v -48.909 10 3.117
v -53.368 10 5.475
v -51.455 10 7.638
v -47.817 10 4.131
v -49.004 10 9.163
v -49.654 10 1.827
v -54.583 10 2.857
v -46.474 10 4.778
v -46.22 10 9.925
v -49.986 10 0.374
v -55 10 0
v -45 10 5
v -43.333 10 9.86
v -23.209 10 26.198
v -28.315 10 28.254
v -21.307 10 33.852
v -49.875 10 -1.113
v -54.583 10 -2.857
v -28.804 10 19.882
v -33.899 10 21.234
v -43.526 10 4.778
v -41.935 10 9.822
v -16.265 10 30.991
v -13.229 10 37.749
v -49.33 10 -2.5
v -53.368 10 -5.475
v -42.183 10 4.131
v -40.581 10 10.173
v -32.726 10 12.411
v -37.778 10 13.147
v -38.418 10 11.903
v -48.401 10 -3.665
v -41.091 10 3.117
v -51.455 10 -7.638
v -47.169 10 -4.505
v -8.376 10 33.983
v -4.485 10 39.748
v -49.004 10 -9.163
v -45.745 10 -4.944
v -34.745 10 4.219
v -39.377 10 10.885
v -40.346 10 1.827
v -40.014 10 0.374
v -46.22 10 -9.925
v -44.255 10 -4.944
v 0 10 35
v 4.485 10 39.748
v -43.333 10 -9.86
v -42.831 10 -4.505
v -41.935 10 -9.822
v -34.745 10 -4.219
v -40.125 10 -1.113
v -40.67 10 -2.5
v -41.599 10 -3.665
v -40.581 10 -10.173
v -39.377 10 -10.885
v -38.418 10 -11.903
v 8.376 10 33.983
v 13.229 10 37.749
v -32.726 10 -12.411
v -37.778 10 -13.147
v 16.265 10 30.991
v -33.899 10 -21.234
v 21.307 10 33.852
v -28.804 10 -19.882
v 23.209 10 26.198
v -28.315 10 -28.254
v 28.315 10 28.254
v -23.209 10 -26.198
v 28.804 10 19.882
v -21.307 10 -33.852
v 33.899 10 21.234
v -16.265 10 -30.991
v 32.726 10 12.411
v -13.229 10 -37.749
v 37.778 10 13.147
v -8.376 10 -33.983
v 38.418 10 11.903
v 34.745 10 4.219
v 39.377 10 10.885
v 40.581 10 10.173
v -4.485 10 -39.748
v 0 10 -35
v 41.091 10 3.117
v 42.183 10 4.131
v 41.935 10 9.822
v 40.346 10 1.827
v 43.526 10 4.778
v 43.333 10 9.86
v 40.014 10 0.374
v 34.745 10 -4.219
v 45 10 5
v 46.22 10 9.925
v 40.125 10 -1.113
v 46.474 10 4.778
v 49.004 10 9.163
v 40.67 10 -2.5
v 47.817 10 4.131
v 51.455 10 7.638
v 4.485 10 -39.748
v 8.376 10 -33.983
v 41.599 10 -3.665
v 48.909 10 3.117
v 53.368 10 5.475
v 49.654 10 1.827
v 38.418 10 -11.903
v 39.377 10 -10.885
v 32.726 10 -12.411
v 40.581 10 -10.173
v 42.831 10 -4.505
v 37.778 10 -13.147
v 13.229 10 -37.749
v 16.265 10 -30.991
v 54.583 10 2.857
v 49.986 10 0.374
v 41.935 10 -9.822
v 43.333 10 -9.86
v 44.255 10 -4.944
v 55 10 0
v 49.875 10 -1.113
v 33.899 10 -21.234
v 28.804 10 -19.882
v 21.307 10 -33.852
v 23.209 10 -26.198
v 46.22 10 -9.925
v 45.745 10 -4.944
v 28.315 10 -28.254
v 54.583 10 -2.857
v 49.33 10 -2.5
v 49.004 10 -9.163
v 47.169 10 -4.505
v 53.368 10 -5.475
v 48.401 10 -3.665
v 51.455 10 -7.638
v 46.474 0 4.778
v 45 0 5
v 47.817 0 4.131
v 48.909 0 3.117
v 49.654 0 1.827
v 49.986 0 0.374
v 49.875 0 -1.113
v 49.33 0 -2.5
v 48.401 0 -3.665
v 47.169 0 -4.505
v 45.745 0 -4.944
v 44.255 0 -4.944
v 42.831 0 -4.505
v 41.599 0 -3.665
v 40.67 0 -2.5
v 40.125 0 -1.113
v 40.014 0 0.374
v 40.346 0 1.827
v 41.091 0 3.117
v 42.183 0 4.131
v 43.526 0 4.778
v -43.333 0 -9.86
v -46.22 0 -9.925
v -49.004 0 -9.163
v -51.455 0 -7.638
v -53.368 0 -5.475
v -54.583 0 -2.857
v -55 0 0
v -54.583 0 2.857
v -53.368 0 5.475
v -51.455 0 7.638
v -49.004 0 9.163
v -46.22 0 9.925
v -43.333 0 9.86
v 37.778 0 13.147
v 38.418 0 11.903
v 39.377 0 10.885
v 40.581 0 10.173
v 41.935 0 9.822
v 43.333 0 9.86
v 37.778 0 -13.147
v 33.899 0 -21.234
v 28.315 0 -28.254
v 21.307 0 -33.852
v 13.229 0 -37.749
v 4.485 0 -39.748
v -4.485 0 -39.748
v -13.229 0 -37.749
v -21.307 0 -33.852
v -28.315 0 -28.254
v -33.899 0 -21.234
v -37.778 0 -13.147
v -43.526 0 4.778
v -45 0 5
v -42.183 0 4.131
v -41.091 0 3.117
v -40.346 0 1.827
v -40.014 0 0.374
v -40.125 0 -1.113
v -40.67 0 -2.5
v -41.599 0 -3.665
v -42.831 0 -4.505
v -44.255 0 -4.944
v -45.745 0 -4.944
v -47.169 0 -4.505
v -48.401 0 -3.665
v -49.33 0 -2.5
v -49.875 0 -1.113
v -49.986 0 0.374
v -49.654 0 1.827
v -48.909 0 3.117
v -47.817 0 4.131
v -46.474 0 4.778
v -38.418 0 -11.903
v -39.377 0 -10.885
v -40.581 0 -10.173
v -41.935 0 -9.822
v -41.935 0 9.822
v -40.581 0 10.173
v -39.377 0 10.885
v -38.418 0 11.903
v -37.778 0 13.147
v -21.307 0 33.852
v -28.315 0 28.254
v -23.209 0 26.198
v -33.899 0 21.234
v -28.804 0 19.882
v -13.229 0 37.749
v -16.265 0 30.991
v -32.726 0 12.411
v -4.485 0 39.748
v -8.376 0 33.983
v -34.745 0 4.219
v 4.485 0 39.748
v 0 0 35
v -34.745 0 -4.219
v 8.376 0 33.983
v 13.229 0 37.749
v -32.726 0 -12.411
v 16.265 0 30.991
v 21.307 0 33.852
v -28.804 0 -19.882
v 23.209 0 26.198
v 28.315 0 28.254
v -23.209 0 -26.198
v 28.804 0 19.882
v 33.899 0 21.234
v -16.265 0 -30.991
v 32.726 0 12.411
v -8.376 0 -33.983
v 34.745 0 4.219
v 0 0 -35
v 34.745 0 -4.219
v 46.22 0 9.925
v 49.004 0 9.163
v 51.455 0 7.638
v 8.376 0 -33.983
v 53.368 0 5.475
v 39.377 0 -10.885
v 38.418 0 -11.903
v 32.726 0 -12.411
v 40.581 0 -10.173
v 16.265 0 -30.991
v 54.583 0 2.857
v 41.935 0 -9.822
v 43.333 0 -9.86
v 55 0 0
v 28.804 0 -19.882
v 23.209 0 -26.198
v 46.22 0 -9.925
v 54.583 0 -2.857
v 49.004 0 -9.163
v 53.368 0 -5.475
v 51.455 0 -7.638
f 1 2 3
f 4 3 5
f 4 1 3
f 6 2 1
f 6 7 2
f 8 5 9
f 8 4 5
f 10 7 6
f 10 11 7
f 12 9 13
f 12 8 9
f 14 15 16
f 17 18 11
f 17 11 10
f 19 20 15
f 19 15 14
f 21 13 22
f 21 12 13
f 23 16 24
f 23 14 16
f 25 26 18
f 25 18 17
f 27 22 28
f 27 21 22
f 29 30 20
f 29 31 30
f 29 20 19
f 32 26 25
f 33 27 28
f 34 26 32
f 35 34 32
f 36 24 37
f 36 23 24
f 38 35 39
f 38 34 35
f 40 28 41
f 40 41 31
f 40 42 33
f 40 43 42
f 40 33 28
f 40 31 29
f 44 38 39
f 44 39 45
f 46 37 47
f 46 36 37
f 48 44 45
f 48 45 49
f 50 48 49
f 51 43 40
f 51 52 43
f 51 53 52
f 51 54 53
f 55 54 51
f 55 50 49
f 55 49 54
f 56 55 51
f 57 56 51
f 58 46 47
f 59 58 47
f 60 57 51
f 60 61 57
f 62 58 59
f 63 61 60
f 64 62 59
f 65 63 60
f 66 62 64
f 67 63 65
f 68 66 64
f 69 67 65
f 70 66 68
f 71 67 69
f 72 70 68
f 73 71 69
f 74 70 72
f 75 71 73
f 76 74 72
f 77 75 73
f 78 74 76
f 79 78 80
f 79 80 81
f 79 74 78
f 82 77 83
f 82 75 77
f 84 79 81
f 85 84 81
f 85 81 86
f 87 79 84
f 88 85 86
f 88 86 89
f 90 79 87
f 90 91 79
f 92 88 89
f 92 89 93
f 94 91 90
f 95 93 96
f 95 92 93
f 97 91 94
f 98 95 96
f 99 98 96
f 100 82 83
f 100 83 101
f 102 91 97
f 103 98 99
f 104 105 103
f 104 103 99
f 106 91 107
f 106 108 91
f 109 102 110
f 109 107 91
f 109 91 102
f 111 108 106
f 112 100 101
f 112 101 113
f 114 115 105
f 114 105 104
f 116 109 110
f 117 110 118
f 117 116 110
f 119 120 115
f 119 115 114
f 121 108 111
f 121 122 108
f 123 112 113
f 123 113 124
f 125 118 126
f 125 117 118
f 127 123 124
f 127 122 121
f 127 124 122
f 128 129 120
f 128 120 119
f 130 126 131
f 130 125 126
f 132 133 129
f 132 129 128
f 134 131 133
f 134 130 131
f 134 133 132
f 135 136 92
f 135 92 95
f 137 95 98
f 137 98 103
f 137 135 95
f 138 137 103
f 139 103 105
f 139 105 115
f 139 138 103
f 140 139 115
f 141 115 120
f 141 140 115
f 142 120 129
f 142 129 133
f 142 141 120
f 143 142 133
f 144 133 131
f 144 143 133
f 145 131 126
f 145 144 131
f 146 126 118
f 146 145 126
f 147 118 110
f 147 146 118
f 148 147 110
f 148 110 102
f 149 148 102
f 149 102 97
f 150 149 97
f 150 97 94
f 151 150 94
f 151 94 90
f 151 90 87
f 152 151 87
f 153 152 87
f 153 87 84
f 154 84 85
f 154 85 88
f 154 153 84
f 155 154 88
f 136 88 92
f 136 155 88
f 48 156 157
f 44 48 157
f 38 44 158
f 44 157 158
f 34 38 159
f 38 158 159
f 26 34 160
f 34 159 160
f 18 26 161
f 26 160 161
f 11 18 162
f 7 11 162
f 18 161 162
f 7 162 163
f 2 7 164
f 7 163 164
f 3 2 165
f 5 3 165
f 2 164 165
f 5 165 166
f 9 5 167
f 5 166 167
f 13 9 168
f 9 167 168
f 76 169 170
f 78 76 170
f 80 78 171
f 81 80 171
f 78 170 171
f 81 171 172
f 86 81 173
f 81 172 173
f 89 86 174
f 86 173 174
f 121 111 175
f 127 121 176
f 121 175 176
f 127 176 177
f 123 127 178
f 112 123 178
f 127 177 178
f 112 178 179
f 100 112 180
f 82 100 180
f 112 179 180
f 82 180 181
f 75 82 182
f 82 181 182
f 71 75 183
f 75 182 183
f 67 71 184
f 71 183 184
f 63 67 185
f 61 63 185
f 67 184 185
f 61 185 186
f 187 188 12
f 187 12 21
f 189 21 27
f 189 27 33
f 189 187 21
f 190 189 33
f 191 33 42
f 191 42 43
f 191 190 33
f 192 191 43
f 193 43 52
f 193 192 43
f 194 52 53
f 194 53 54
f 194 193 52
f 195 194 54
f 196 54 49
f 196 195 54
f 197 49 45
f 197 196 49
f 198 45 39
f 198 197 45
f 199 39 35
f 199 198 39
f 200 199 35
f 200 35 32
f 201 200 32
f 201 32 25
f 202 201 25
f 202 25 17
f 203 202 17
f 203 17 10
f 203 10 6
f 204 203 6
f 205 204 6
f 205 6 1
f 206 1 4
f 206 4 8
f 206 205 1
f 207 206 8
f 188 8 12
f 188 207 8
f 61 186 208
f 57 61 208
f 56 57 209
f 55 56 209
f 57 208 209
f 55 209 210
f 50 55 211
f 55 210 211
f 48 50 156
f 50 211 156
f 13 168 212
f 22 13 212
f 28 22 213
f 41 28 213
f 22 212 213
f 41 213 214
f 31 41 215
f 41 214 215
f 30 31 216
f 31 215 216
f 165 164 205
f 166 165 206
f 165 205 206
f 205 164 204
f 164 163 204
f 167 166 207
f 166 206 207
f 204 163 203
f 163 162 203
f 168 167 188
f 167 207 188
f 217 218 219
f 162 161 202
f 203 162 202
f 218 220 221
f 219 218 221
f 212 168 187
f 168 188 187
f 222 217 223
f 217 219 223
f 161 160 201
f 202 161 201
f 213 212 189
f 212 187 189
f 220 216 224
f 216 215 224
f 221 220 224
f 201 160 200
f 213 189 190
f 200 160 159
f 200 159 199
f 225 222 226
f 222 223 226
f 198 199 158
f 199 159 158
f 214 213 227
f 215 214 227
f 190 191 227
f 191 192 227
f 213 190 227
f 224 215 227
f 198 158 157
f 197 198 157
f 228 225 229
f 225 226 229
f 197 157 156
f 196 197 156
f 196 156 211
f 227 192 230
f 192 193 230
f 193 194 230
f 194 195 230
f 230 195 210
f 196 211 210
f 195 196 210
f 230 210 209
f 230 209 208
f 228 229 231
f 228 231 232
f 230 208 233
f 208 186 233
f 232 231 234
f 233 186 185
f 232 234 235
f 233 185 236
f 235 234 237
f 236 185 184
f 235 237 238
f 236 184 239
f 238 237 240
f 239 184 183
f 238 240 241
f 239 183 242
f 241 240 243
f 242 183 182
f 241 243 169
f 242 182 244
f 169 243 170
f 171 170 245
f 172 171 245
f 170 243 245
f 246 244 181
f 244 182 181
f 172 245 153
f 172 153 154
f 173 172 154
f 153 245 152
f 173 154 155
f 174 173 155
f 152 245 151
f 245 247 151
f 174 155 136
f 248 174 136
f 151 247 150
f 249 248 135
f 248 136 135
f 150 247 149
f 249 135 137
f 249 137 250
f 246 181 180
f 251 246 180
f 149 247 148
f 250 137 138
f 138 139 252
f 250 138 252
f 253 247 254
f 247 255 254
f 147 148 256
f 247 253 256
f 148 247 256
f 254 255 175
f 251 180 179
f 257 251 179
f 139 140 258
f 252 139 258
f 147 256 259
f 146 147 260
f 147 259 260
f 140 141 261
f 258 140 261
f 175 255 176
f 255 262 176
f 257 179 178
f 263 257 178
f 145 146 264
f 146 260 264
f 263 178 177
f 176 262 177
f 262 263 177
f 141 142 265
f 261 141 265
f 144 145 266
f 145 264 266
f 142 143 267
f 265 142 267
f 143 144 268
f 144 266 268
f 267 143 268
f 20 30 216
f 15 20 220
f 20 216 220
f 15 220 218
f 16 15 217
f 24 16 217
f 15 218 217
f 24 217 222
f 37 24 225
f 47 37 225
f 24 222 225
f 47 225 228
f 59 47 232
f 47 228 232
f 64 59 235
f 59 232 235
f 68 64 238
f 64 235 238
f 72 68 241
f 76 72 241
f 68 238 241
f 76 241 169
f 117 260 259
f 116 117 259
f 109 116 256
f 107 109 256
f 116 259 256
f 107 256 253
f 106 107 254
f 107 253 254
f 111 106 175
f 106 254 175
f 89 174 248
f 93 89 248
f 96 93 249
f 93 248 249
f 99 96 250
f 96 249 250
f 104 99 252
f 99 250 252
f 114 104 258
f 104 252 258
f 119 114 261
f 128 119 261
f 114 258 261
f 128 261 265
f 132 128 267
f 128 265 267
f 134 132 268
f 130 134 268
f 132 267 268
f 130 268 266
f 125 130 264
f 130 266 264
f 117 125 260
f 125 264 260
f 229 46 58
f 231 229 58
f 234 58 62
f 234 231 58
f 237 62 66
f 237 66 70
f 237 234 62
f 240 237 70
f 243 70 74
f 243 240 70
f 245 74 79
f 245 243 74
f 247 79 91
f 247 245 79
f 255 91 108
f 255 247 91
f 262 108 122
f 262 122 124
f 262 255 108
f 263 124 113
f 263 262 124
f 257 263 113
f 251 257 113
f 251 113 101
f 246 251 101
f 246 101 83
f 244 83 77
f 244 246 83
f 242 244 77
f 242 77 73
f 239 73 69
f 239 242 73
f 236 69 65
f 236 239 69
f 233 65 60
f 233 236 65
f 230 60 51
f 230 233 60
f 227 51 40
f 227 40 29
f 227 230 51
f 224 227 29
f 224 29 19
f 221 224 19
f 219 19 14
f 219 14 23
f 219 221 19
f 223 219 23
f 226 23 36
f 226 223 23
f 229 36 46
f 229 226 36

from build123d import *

# Parameters (mm, degrees)
SKETCH1_R           = 35
SKETCH1_R_2         = 5
BOSS_EXTRUDE1_DEPTH = 10


with BuildPart() as part:
    # Sketch1 → Boss-Extrude1 (new body)
    with BuildSketch(Plane(origin=(0, 0, 0), x_dir=(1, 0, 0), z_dir=(0, 1, 0))):
        with BuildLine():
            ThreePointArc((-37.777777778, -13.146843962), (0, -40), (37.777777778, -13.146843962))
            ThreePointArc((37.777777778, -13.146843962), (39.954124614, -10.486884629), (43.333333333, -9.860132972))
            ThreePointArc((43.333333333, -9.860132972), (55, 0), (43.333333333, 9.860132972))
            ThreePointArc((43.333333333, 9.860132972), (39.954124614, 10.486884629), (37.777777778, 13.146843962))
            ThreePointArc((37.777777778, 13.146843962), (0, 40), (-37.777777778, 13.146843962))
            ThreePointArc((-37.777777778, 13.146843962), (-39.954124614, 10.486884629), (-43.333333333, 9.860132972))
            ThreePointArc((-43.333333333, 9.860132972), (-55, 0), (-43.333333333, -9.860132972))
            ThreePointArc((-43.333333333, -9.860132972), (-39.954124614, -10.486884629), (-37.777777778, -13.146843962))
        make_face()
        with Locations(Location((0, 0, 0), (0, 0, 270))):
            Circle(SKETCH1_R, mode=Mode.SUBTRACT)
        with Locations(Location((-45, 0, 0), (0, 0, 270))):
            Circle(SKETCH1_R_2, mode=Mode.SUBTRACT)
        with Locations(Location((45, 0, 0), (0, 0, 270))):
            Circle(SKETCH1_R_2, mode=Mode.SUBTRACT)
    extrude(amount=BOSS_EXTRUDE1_DEPTH)


solid = part.part
